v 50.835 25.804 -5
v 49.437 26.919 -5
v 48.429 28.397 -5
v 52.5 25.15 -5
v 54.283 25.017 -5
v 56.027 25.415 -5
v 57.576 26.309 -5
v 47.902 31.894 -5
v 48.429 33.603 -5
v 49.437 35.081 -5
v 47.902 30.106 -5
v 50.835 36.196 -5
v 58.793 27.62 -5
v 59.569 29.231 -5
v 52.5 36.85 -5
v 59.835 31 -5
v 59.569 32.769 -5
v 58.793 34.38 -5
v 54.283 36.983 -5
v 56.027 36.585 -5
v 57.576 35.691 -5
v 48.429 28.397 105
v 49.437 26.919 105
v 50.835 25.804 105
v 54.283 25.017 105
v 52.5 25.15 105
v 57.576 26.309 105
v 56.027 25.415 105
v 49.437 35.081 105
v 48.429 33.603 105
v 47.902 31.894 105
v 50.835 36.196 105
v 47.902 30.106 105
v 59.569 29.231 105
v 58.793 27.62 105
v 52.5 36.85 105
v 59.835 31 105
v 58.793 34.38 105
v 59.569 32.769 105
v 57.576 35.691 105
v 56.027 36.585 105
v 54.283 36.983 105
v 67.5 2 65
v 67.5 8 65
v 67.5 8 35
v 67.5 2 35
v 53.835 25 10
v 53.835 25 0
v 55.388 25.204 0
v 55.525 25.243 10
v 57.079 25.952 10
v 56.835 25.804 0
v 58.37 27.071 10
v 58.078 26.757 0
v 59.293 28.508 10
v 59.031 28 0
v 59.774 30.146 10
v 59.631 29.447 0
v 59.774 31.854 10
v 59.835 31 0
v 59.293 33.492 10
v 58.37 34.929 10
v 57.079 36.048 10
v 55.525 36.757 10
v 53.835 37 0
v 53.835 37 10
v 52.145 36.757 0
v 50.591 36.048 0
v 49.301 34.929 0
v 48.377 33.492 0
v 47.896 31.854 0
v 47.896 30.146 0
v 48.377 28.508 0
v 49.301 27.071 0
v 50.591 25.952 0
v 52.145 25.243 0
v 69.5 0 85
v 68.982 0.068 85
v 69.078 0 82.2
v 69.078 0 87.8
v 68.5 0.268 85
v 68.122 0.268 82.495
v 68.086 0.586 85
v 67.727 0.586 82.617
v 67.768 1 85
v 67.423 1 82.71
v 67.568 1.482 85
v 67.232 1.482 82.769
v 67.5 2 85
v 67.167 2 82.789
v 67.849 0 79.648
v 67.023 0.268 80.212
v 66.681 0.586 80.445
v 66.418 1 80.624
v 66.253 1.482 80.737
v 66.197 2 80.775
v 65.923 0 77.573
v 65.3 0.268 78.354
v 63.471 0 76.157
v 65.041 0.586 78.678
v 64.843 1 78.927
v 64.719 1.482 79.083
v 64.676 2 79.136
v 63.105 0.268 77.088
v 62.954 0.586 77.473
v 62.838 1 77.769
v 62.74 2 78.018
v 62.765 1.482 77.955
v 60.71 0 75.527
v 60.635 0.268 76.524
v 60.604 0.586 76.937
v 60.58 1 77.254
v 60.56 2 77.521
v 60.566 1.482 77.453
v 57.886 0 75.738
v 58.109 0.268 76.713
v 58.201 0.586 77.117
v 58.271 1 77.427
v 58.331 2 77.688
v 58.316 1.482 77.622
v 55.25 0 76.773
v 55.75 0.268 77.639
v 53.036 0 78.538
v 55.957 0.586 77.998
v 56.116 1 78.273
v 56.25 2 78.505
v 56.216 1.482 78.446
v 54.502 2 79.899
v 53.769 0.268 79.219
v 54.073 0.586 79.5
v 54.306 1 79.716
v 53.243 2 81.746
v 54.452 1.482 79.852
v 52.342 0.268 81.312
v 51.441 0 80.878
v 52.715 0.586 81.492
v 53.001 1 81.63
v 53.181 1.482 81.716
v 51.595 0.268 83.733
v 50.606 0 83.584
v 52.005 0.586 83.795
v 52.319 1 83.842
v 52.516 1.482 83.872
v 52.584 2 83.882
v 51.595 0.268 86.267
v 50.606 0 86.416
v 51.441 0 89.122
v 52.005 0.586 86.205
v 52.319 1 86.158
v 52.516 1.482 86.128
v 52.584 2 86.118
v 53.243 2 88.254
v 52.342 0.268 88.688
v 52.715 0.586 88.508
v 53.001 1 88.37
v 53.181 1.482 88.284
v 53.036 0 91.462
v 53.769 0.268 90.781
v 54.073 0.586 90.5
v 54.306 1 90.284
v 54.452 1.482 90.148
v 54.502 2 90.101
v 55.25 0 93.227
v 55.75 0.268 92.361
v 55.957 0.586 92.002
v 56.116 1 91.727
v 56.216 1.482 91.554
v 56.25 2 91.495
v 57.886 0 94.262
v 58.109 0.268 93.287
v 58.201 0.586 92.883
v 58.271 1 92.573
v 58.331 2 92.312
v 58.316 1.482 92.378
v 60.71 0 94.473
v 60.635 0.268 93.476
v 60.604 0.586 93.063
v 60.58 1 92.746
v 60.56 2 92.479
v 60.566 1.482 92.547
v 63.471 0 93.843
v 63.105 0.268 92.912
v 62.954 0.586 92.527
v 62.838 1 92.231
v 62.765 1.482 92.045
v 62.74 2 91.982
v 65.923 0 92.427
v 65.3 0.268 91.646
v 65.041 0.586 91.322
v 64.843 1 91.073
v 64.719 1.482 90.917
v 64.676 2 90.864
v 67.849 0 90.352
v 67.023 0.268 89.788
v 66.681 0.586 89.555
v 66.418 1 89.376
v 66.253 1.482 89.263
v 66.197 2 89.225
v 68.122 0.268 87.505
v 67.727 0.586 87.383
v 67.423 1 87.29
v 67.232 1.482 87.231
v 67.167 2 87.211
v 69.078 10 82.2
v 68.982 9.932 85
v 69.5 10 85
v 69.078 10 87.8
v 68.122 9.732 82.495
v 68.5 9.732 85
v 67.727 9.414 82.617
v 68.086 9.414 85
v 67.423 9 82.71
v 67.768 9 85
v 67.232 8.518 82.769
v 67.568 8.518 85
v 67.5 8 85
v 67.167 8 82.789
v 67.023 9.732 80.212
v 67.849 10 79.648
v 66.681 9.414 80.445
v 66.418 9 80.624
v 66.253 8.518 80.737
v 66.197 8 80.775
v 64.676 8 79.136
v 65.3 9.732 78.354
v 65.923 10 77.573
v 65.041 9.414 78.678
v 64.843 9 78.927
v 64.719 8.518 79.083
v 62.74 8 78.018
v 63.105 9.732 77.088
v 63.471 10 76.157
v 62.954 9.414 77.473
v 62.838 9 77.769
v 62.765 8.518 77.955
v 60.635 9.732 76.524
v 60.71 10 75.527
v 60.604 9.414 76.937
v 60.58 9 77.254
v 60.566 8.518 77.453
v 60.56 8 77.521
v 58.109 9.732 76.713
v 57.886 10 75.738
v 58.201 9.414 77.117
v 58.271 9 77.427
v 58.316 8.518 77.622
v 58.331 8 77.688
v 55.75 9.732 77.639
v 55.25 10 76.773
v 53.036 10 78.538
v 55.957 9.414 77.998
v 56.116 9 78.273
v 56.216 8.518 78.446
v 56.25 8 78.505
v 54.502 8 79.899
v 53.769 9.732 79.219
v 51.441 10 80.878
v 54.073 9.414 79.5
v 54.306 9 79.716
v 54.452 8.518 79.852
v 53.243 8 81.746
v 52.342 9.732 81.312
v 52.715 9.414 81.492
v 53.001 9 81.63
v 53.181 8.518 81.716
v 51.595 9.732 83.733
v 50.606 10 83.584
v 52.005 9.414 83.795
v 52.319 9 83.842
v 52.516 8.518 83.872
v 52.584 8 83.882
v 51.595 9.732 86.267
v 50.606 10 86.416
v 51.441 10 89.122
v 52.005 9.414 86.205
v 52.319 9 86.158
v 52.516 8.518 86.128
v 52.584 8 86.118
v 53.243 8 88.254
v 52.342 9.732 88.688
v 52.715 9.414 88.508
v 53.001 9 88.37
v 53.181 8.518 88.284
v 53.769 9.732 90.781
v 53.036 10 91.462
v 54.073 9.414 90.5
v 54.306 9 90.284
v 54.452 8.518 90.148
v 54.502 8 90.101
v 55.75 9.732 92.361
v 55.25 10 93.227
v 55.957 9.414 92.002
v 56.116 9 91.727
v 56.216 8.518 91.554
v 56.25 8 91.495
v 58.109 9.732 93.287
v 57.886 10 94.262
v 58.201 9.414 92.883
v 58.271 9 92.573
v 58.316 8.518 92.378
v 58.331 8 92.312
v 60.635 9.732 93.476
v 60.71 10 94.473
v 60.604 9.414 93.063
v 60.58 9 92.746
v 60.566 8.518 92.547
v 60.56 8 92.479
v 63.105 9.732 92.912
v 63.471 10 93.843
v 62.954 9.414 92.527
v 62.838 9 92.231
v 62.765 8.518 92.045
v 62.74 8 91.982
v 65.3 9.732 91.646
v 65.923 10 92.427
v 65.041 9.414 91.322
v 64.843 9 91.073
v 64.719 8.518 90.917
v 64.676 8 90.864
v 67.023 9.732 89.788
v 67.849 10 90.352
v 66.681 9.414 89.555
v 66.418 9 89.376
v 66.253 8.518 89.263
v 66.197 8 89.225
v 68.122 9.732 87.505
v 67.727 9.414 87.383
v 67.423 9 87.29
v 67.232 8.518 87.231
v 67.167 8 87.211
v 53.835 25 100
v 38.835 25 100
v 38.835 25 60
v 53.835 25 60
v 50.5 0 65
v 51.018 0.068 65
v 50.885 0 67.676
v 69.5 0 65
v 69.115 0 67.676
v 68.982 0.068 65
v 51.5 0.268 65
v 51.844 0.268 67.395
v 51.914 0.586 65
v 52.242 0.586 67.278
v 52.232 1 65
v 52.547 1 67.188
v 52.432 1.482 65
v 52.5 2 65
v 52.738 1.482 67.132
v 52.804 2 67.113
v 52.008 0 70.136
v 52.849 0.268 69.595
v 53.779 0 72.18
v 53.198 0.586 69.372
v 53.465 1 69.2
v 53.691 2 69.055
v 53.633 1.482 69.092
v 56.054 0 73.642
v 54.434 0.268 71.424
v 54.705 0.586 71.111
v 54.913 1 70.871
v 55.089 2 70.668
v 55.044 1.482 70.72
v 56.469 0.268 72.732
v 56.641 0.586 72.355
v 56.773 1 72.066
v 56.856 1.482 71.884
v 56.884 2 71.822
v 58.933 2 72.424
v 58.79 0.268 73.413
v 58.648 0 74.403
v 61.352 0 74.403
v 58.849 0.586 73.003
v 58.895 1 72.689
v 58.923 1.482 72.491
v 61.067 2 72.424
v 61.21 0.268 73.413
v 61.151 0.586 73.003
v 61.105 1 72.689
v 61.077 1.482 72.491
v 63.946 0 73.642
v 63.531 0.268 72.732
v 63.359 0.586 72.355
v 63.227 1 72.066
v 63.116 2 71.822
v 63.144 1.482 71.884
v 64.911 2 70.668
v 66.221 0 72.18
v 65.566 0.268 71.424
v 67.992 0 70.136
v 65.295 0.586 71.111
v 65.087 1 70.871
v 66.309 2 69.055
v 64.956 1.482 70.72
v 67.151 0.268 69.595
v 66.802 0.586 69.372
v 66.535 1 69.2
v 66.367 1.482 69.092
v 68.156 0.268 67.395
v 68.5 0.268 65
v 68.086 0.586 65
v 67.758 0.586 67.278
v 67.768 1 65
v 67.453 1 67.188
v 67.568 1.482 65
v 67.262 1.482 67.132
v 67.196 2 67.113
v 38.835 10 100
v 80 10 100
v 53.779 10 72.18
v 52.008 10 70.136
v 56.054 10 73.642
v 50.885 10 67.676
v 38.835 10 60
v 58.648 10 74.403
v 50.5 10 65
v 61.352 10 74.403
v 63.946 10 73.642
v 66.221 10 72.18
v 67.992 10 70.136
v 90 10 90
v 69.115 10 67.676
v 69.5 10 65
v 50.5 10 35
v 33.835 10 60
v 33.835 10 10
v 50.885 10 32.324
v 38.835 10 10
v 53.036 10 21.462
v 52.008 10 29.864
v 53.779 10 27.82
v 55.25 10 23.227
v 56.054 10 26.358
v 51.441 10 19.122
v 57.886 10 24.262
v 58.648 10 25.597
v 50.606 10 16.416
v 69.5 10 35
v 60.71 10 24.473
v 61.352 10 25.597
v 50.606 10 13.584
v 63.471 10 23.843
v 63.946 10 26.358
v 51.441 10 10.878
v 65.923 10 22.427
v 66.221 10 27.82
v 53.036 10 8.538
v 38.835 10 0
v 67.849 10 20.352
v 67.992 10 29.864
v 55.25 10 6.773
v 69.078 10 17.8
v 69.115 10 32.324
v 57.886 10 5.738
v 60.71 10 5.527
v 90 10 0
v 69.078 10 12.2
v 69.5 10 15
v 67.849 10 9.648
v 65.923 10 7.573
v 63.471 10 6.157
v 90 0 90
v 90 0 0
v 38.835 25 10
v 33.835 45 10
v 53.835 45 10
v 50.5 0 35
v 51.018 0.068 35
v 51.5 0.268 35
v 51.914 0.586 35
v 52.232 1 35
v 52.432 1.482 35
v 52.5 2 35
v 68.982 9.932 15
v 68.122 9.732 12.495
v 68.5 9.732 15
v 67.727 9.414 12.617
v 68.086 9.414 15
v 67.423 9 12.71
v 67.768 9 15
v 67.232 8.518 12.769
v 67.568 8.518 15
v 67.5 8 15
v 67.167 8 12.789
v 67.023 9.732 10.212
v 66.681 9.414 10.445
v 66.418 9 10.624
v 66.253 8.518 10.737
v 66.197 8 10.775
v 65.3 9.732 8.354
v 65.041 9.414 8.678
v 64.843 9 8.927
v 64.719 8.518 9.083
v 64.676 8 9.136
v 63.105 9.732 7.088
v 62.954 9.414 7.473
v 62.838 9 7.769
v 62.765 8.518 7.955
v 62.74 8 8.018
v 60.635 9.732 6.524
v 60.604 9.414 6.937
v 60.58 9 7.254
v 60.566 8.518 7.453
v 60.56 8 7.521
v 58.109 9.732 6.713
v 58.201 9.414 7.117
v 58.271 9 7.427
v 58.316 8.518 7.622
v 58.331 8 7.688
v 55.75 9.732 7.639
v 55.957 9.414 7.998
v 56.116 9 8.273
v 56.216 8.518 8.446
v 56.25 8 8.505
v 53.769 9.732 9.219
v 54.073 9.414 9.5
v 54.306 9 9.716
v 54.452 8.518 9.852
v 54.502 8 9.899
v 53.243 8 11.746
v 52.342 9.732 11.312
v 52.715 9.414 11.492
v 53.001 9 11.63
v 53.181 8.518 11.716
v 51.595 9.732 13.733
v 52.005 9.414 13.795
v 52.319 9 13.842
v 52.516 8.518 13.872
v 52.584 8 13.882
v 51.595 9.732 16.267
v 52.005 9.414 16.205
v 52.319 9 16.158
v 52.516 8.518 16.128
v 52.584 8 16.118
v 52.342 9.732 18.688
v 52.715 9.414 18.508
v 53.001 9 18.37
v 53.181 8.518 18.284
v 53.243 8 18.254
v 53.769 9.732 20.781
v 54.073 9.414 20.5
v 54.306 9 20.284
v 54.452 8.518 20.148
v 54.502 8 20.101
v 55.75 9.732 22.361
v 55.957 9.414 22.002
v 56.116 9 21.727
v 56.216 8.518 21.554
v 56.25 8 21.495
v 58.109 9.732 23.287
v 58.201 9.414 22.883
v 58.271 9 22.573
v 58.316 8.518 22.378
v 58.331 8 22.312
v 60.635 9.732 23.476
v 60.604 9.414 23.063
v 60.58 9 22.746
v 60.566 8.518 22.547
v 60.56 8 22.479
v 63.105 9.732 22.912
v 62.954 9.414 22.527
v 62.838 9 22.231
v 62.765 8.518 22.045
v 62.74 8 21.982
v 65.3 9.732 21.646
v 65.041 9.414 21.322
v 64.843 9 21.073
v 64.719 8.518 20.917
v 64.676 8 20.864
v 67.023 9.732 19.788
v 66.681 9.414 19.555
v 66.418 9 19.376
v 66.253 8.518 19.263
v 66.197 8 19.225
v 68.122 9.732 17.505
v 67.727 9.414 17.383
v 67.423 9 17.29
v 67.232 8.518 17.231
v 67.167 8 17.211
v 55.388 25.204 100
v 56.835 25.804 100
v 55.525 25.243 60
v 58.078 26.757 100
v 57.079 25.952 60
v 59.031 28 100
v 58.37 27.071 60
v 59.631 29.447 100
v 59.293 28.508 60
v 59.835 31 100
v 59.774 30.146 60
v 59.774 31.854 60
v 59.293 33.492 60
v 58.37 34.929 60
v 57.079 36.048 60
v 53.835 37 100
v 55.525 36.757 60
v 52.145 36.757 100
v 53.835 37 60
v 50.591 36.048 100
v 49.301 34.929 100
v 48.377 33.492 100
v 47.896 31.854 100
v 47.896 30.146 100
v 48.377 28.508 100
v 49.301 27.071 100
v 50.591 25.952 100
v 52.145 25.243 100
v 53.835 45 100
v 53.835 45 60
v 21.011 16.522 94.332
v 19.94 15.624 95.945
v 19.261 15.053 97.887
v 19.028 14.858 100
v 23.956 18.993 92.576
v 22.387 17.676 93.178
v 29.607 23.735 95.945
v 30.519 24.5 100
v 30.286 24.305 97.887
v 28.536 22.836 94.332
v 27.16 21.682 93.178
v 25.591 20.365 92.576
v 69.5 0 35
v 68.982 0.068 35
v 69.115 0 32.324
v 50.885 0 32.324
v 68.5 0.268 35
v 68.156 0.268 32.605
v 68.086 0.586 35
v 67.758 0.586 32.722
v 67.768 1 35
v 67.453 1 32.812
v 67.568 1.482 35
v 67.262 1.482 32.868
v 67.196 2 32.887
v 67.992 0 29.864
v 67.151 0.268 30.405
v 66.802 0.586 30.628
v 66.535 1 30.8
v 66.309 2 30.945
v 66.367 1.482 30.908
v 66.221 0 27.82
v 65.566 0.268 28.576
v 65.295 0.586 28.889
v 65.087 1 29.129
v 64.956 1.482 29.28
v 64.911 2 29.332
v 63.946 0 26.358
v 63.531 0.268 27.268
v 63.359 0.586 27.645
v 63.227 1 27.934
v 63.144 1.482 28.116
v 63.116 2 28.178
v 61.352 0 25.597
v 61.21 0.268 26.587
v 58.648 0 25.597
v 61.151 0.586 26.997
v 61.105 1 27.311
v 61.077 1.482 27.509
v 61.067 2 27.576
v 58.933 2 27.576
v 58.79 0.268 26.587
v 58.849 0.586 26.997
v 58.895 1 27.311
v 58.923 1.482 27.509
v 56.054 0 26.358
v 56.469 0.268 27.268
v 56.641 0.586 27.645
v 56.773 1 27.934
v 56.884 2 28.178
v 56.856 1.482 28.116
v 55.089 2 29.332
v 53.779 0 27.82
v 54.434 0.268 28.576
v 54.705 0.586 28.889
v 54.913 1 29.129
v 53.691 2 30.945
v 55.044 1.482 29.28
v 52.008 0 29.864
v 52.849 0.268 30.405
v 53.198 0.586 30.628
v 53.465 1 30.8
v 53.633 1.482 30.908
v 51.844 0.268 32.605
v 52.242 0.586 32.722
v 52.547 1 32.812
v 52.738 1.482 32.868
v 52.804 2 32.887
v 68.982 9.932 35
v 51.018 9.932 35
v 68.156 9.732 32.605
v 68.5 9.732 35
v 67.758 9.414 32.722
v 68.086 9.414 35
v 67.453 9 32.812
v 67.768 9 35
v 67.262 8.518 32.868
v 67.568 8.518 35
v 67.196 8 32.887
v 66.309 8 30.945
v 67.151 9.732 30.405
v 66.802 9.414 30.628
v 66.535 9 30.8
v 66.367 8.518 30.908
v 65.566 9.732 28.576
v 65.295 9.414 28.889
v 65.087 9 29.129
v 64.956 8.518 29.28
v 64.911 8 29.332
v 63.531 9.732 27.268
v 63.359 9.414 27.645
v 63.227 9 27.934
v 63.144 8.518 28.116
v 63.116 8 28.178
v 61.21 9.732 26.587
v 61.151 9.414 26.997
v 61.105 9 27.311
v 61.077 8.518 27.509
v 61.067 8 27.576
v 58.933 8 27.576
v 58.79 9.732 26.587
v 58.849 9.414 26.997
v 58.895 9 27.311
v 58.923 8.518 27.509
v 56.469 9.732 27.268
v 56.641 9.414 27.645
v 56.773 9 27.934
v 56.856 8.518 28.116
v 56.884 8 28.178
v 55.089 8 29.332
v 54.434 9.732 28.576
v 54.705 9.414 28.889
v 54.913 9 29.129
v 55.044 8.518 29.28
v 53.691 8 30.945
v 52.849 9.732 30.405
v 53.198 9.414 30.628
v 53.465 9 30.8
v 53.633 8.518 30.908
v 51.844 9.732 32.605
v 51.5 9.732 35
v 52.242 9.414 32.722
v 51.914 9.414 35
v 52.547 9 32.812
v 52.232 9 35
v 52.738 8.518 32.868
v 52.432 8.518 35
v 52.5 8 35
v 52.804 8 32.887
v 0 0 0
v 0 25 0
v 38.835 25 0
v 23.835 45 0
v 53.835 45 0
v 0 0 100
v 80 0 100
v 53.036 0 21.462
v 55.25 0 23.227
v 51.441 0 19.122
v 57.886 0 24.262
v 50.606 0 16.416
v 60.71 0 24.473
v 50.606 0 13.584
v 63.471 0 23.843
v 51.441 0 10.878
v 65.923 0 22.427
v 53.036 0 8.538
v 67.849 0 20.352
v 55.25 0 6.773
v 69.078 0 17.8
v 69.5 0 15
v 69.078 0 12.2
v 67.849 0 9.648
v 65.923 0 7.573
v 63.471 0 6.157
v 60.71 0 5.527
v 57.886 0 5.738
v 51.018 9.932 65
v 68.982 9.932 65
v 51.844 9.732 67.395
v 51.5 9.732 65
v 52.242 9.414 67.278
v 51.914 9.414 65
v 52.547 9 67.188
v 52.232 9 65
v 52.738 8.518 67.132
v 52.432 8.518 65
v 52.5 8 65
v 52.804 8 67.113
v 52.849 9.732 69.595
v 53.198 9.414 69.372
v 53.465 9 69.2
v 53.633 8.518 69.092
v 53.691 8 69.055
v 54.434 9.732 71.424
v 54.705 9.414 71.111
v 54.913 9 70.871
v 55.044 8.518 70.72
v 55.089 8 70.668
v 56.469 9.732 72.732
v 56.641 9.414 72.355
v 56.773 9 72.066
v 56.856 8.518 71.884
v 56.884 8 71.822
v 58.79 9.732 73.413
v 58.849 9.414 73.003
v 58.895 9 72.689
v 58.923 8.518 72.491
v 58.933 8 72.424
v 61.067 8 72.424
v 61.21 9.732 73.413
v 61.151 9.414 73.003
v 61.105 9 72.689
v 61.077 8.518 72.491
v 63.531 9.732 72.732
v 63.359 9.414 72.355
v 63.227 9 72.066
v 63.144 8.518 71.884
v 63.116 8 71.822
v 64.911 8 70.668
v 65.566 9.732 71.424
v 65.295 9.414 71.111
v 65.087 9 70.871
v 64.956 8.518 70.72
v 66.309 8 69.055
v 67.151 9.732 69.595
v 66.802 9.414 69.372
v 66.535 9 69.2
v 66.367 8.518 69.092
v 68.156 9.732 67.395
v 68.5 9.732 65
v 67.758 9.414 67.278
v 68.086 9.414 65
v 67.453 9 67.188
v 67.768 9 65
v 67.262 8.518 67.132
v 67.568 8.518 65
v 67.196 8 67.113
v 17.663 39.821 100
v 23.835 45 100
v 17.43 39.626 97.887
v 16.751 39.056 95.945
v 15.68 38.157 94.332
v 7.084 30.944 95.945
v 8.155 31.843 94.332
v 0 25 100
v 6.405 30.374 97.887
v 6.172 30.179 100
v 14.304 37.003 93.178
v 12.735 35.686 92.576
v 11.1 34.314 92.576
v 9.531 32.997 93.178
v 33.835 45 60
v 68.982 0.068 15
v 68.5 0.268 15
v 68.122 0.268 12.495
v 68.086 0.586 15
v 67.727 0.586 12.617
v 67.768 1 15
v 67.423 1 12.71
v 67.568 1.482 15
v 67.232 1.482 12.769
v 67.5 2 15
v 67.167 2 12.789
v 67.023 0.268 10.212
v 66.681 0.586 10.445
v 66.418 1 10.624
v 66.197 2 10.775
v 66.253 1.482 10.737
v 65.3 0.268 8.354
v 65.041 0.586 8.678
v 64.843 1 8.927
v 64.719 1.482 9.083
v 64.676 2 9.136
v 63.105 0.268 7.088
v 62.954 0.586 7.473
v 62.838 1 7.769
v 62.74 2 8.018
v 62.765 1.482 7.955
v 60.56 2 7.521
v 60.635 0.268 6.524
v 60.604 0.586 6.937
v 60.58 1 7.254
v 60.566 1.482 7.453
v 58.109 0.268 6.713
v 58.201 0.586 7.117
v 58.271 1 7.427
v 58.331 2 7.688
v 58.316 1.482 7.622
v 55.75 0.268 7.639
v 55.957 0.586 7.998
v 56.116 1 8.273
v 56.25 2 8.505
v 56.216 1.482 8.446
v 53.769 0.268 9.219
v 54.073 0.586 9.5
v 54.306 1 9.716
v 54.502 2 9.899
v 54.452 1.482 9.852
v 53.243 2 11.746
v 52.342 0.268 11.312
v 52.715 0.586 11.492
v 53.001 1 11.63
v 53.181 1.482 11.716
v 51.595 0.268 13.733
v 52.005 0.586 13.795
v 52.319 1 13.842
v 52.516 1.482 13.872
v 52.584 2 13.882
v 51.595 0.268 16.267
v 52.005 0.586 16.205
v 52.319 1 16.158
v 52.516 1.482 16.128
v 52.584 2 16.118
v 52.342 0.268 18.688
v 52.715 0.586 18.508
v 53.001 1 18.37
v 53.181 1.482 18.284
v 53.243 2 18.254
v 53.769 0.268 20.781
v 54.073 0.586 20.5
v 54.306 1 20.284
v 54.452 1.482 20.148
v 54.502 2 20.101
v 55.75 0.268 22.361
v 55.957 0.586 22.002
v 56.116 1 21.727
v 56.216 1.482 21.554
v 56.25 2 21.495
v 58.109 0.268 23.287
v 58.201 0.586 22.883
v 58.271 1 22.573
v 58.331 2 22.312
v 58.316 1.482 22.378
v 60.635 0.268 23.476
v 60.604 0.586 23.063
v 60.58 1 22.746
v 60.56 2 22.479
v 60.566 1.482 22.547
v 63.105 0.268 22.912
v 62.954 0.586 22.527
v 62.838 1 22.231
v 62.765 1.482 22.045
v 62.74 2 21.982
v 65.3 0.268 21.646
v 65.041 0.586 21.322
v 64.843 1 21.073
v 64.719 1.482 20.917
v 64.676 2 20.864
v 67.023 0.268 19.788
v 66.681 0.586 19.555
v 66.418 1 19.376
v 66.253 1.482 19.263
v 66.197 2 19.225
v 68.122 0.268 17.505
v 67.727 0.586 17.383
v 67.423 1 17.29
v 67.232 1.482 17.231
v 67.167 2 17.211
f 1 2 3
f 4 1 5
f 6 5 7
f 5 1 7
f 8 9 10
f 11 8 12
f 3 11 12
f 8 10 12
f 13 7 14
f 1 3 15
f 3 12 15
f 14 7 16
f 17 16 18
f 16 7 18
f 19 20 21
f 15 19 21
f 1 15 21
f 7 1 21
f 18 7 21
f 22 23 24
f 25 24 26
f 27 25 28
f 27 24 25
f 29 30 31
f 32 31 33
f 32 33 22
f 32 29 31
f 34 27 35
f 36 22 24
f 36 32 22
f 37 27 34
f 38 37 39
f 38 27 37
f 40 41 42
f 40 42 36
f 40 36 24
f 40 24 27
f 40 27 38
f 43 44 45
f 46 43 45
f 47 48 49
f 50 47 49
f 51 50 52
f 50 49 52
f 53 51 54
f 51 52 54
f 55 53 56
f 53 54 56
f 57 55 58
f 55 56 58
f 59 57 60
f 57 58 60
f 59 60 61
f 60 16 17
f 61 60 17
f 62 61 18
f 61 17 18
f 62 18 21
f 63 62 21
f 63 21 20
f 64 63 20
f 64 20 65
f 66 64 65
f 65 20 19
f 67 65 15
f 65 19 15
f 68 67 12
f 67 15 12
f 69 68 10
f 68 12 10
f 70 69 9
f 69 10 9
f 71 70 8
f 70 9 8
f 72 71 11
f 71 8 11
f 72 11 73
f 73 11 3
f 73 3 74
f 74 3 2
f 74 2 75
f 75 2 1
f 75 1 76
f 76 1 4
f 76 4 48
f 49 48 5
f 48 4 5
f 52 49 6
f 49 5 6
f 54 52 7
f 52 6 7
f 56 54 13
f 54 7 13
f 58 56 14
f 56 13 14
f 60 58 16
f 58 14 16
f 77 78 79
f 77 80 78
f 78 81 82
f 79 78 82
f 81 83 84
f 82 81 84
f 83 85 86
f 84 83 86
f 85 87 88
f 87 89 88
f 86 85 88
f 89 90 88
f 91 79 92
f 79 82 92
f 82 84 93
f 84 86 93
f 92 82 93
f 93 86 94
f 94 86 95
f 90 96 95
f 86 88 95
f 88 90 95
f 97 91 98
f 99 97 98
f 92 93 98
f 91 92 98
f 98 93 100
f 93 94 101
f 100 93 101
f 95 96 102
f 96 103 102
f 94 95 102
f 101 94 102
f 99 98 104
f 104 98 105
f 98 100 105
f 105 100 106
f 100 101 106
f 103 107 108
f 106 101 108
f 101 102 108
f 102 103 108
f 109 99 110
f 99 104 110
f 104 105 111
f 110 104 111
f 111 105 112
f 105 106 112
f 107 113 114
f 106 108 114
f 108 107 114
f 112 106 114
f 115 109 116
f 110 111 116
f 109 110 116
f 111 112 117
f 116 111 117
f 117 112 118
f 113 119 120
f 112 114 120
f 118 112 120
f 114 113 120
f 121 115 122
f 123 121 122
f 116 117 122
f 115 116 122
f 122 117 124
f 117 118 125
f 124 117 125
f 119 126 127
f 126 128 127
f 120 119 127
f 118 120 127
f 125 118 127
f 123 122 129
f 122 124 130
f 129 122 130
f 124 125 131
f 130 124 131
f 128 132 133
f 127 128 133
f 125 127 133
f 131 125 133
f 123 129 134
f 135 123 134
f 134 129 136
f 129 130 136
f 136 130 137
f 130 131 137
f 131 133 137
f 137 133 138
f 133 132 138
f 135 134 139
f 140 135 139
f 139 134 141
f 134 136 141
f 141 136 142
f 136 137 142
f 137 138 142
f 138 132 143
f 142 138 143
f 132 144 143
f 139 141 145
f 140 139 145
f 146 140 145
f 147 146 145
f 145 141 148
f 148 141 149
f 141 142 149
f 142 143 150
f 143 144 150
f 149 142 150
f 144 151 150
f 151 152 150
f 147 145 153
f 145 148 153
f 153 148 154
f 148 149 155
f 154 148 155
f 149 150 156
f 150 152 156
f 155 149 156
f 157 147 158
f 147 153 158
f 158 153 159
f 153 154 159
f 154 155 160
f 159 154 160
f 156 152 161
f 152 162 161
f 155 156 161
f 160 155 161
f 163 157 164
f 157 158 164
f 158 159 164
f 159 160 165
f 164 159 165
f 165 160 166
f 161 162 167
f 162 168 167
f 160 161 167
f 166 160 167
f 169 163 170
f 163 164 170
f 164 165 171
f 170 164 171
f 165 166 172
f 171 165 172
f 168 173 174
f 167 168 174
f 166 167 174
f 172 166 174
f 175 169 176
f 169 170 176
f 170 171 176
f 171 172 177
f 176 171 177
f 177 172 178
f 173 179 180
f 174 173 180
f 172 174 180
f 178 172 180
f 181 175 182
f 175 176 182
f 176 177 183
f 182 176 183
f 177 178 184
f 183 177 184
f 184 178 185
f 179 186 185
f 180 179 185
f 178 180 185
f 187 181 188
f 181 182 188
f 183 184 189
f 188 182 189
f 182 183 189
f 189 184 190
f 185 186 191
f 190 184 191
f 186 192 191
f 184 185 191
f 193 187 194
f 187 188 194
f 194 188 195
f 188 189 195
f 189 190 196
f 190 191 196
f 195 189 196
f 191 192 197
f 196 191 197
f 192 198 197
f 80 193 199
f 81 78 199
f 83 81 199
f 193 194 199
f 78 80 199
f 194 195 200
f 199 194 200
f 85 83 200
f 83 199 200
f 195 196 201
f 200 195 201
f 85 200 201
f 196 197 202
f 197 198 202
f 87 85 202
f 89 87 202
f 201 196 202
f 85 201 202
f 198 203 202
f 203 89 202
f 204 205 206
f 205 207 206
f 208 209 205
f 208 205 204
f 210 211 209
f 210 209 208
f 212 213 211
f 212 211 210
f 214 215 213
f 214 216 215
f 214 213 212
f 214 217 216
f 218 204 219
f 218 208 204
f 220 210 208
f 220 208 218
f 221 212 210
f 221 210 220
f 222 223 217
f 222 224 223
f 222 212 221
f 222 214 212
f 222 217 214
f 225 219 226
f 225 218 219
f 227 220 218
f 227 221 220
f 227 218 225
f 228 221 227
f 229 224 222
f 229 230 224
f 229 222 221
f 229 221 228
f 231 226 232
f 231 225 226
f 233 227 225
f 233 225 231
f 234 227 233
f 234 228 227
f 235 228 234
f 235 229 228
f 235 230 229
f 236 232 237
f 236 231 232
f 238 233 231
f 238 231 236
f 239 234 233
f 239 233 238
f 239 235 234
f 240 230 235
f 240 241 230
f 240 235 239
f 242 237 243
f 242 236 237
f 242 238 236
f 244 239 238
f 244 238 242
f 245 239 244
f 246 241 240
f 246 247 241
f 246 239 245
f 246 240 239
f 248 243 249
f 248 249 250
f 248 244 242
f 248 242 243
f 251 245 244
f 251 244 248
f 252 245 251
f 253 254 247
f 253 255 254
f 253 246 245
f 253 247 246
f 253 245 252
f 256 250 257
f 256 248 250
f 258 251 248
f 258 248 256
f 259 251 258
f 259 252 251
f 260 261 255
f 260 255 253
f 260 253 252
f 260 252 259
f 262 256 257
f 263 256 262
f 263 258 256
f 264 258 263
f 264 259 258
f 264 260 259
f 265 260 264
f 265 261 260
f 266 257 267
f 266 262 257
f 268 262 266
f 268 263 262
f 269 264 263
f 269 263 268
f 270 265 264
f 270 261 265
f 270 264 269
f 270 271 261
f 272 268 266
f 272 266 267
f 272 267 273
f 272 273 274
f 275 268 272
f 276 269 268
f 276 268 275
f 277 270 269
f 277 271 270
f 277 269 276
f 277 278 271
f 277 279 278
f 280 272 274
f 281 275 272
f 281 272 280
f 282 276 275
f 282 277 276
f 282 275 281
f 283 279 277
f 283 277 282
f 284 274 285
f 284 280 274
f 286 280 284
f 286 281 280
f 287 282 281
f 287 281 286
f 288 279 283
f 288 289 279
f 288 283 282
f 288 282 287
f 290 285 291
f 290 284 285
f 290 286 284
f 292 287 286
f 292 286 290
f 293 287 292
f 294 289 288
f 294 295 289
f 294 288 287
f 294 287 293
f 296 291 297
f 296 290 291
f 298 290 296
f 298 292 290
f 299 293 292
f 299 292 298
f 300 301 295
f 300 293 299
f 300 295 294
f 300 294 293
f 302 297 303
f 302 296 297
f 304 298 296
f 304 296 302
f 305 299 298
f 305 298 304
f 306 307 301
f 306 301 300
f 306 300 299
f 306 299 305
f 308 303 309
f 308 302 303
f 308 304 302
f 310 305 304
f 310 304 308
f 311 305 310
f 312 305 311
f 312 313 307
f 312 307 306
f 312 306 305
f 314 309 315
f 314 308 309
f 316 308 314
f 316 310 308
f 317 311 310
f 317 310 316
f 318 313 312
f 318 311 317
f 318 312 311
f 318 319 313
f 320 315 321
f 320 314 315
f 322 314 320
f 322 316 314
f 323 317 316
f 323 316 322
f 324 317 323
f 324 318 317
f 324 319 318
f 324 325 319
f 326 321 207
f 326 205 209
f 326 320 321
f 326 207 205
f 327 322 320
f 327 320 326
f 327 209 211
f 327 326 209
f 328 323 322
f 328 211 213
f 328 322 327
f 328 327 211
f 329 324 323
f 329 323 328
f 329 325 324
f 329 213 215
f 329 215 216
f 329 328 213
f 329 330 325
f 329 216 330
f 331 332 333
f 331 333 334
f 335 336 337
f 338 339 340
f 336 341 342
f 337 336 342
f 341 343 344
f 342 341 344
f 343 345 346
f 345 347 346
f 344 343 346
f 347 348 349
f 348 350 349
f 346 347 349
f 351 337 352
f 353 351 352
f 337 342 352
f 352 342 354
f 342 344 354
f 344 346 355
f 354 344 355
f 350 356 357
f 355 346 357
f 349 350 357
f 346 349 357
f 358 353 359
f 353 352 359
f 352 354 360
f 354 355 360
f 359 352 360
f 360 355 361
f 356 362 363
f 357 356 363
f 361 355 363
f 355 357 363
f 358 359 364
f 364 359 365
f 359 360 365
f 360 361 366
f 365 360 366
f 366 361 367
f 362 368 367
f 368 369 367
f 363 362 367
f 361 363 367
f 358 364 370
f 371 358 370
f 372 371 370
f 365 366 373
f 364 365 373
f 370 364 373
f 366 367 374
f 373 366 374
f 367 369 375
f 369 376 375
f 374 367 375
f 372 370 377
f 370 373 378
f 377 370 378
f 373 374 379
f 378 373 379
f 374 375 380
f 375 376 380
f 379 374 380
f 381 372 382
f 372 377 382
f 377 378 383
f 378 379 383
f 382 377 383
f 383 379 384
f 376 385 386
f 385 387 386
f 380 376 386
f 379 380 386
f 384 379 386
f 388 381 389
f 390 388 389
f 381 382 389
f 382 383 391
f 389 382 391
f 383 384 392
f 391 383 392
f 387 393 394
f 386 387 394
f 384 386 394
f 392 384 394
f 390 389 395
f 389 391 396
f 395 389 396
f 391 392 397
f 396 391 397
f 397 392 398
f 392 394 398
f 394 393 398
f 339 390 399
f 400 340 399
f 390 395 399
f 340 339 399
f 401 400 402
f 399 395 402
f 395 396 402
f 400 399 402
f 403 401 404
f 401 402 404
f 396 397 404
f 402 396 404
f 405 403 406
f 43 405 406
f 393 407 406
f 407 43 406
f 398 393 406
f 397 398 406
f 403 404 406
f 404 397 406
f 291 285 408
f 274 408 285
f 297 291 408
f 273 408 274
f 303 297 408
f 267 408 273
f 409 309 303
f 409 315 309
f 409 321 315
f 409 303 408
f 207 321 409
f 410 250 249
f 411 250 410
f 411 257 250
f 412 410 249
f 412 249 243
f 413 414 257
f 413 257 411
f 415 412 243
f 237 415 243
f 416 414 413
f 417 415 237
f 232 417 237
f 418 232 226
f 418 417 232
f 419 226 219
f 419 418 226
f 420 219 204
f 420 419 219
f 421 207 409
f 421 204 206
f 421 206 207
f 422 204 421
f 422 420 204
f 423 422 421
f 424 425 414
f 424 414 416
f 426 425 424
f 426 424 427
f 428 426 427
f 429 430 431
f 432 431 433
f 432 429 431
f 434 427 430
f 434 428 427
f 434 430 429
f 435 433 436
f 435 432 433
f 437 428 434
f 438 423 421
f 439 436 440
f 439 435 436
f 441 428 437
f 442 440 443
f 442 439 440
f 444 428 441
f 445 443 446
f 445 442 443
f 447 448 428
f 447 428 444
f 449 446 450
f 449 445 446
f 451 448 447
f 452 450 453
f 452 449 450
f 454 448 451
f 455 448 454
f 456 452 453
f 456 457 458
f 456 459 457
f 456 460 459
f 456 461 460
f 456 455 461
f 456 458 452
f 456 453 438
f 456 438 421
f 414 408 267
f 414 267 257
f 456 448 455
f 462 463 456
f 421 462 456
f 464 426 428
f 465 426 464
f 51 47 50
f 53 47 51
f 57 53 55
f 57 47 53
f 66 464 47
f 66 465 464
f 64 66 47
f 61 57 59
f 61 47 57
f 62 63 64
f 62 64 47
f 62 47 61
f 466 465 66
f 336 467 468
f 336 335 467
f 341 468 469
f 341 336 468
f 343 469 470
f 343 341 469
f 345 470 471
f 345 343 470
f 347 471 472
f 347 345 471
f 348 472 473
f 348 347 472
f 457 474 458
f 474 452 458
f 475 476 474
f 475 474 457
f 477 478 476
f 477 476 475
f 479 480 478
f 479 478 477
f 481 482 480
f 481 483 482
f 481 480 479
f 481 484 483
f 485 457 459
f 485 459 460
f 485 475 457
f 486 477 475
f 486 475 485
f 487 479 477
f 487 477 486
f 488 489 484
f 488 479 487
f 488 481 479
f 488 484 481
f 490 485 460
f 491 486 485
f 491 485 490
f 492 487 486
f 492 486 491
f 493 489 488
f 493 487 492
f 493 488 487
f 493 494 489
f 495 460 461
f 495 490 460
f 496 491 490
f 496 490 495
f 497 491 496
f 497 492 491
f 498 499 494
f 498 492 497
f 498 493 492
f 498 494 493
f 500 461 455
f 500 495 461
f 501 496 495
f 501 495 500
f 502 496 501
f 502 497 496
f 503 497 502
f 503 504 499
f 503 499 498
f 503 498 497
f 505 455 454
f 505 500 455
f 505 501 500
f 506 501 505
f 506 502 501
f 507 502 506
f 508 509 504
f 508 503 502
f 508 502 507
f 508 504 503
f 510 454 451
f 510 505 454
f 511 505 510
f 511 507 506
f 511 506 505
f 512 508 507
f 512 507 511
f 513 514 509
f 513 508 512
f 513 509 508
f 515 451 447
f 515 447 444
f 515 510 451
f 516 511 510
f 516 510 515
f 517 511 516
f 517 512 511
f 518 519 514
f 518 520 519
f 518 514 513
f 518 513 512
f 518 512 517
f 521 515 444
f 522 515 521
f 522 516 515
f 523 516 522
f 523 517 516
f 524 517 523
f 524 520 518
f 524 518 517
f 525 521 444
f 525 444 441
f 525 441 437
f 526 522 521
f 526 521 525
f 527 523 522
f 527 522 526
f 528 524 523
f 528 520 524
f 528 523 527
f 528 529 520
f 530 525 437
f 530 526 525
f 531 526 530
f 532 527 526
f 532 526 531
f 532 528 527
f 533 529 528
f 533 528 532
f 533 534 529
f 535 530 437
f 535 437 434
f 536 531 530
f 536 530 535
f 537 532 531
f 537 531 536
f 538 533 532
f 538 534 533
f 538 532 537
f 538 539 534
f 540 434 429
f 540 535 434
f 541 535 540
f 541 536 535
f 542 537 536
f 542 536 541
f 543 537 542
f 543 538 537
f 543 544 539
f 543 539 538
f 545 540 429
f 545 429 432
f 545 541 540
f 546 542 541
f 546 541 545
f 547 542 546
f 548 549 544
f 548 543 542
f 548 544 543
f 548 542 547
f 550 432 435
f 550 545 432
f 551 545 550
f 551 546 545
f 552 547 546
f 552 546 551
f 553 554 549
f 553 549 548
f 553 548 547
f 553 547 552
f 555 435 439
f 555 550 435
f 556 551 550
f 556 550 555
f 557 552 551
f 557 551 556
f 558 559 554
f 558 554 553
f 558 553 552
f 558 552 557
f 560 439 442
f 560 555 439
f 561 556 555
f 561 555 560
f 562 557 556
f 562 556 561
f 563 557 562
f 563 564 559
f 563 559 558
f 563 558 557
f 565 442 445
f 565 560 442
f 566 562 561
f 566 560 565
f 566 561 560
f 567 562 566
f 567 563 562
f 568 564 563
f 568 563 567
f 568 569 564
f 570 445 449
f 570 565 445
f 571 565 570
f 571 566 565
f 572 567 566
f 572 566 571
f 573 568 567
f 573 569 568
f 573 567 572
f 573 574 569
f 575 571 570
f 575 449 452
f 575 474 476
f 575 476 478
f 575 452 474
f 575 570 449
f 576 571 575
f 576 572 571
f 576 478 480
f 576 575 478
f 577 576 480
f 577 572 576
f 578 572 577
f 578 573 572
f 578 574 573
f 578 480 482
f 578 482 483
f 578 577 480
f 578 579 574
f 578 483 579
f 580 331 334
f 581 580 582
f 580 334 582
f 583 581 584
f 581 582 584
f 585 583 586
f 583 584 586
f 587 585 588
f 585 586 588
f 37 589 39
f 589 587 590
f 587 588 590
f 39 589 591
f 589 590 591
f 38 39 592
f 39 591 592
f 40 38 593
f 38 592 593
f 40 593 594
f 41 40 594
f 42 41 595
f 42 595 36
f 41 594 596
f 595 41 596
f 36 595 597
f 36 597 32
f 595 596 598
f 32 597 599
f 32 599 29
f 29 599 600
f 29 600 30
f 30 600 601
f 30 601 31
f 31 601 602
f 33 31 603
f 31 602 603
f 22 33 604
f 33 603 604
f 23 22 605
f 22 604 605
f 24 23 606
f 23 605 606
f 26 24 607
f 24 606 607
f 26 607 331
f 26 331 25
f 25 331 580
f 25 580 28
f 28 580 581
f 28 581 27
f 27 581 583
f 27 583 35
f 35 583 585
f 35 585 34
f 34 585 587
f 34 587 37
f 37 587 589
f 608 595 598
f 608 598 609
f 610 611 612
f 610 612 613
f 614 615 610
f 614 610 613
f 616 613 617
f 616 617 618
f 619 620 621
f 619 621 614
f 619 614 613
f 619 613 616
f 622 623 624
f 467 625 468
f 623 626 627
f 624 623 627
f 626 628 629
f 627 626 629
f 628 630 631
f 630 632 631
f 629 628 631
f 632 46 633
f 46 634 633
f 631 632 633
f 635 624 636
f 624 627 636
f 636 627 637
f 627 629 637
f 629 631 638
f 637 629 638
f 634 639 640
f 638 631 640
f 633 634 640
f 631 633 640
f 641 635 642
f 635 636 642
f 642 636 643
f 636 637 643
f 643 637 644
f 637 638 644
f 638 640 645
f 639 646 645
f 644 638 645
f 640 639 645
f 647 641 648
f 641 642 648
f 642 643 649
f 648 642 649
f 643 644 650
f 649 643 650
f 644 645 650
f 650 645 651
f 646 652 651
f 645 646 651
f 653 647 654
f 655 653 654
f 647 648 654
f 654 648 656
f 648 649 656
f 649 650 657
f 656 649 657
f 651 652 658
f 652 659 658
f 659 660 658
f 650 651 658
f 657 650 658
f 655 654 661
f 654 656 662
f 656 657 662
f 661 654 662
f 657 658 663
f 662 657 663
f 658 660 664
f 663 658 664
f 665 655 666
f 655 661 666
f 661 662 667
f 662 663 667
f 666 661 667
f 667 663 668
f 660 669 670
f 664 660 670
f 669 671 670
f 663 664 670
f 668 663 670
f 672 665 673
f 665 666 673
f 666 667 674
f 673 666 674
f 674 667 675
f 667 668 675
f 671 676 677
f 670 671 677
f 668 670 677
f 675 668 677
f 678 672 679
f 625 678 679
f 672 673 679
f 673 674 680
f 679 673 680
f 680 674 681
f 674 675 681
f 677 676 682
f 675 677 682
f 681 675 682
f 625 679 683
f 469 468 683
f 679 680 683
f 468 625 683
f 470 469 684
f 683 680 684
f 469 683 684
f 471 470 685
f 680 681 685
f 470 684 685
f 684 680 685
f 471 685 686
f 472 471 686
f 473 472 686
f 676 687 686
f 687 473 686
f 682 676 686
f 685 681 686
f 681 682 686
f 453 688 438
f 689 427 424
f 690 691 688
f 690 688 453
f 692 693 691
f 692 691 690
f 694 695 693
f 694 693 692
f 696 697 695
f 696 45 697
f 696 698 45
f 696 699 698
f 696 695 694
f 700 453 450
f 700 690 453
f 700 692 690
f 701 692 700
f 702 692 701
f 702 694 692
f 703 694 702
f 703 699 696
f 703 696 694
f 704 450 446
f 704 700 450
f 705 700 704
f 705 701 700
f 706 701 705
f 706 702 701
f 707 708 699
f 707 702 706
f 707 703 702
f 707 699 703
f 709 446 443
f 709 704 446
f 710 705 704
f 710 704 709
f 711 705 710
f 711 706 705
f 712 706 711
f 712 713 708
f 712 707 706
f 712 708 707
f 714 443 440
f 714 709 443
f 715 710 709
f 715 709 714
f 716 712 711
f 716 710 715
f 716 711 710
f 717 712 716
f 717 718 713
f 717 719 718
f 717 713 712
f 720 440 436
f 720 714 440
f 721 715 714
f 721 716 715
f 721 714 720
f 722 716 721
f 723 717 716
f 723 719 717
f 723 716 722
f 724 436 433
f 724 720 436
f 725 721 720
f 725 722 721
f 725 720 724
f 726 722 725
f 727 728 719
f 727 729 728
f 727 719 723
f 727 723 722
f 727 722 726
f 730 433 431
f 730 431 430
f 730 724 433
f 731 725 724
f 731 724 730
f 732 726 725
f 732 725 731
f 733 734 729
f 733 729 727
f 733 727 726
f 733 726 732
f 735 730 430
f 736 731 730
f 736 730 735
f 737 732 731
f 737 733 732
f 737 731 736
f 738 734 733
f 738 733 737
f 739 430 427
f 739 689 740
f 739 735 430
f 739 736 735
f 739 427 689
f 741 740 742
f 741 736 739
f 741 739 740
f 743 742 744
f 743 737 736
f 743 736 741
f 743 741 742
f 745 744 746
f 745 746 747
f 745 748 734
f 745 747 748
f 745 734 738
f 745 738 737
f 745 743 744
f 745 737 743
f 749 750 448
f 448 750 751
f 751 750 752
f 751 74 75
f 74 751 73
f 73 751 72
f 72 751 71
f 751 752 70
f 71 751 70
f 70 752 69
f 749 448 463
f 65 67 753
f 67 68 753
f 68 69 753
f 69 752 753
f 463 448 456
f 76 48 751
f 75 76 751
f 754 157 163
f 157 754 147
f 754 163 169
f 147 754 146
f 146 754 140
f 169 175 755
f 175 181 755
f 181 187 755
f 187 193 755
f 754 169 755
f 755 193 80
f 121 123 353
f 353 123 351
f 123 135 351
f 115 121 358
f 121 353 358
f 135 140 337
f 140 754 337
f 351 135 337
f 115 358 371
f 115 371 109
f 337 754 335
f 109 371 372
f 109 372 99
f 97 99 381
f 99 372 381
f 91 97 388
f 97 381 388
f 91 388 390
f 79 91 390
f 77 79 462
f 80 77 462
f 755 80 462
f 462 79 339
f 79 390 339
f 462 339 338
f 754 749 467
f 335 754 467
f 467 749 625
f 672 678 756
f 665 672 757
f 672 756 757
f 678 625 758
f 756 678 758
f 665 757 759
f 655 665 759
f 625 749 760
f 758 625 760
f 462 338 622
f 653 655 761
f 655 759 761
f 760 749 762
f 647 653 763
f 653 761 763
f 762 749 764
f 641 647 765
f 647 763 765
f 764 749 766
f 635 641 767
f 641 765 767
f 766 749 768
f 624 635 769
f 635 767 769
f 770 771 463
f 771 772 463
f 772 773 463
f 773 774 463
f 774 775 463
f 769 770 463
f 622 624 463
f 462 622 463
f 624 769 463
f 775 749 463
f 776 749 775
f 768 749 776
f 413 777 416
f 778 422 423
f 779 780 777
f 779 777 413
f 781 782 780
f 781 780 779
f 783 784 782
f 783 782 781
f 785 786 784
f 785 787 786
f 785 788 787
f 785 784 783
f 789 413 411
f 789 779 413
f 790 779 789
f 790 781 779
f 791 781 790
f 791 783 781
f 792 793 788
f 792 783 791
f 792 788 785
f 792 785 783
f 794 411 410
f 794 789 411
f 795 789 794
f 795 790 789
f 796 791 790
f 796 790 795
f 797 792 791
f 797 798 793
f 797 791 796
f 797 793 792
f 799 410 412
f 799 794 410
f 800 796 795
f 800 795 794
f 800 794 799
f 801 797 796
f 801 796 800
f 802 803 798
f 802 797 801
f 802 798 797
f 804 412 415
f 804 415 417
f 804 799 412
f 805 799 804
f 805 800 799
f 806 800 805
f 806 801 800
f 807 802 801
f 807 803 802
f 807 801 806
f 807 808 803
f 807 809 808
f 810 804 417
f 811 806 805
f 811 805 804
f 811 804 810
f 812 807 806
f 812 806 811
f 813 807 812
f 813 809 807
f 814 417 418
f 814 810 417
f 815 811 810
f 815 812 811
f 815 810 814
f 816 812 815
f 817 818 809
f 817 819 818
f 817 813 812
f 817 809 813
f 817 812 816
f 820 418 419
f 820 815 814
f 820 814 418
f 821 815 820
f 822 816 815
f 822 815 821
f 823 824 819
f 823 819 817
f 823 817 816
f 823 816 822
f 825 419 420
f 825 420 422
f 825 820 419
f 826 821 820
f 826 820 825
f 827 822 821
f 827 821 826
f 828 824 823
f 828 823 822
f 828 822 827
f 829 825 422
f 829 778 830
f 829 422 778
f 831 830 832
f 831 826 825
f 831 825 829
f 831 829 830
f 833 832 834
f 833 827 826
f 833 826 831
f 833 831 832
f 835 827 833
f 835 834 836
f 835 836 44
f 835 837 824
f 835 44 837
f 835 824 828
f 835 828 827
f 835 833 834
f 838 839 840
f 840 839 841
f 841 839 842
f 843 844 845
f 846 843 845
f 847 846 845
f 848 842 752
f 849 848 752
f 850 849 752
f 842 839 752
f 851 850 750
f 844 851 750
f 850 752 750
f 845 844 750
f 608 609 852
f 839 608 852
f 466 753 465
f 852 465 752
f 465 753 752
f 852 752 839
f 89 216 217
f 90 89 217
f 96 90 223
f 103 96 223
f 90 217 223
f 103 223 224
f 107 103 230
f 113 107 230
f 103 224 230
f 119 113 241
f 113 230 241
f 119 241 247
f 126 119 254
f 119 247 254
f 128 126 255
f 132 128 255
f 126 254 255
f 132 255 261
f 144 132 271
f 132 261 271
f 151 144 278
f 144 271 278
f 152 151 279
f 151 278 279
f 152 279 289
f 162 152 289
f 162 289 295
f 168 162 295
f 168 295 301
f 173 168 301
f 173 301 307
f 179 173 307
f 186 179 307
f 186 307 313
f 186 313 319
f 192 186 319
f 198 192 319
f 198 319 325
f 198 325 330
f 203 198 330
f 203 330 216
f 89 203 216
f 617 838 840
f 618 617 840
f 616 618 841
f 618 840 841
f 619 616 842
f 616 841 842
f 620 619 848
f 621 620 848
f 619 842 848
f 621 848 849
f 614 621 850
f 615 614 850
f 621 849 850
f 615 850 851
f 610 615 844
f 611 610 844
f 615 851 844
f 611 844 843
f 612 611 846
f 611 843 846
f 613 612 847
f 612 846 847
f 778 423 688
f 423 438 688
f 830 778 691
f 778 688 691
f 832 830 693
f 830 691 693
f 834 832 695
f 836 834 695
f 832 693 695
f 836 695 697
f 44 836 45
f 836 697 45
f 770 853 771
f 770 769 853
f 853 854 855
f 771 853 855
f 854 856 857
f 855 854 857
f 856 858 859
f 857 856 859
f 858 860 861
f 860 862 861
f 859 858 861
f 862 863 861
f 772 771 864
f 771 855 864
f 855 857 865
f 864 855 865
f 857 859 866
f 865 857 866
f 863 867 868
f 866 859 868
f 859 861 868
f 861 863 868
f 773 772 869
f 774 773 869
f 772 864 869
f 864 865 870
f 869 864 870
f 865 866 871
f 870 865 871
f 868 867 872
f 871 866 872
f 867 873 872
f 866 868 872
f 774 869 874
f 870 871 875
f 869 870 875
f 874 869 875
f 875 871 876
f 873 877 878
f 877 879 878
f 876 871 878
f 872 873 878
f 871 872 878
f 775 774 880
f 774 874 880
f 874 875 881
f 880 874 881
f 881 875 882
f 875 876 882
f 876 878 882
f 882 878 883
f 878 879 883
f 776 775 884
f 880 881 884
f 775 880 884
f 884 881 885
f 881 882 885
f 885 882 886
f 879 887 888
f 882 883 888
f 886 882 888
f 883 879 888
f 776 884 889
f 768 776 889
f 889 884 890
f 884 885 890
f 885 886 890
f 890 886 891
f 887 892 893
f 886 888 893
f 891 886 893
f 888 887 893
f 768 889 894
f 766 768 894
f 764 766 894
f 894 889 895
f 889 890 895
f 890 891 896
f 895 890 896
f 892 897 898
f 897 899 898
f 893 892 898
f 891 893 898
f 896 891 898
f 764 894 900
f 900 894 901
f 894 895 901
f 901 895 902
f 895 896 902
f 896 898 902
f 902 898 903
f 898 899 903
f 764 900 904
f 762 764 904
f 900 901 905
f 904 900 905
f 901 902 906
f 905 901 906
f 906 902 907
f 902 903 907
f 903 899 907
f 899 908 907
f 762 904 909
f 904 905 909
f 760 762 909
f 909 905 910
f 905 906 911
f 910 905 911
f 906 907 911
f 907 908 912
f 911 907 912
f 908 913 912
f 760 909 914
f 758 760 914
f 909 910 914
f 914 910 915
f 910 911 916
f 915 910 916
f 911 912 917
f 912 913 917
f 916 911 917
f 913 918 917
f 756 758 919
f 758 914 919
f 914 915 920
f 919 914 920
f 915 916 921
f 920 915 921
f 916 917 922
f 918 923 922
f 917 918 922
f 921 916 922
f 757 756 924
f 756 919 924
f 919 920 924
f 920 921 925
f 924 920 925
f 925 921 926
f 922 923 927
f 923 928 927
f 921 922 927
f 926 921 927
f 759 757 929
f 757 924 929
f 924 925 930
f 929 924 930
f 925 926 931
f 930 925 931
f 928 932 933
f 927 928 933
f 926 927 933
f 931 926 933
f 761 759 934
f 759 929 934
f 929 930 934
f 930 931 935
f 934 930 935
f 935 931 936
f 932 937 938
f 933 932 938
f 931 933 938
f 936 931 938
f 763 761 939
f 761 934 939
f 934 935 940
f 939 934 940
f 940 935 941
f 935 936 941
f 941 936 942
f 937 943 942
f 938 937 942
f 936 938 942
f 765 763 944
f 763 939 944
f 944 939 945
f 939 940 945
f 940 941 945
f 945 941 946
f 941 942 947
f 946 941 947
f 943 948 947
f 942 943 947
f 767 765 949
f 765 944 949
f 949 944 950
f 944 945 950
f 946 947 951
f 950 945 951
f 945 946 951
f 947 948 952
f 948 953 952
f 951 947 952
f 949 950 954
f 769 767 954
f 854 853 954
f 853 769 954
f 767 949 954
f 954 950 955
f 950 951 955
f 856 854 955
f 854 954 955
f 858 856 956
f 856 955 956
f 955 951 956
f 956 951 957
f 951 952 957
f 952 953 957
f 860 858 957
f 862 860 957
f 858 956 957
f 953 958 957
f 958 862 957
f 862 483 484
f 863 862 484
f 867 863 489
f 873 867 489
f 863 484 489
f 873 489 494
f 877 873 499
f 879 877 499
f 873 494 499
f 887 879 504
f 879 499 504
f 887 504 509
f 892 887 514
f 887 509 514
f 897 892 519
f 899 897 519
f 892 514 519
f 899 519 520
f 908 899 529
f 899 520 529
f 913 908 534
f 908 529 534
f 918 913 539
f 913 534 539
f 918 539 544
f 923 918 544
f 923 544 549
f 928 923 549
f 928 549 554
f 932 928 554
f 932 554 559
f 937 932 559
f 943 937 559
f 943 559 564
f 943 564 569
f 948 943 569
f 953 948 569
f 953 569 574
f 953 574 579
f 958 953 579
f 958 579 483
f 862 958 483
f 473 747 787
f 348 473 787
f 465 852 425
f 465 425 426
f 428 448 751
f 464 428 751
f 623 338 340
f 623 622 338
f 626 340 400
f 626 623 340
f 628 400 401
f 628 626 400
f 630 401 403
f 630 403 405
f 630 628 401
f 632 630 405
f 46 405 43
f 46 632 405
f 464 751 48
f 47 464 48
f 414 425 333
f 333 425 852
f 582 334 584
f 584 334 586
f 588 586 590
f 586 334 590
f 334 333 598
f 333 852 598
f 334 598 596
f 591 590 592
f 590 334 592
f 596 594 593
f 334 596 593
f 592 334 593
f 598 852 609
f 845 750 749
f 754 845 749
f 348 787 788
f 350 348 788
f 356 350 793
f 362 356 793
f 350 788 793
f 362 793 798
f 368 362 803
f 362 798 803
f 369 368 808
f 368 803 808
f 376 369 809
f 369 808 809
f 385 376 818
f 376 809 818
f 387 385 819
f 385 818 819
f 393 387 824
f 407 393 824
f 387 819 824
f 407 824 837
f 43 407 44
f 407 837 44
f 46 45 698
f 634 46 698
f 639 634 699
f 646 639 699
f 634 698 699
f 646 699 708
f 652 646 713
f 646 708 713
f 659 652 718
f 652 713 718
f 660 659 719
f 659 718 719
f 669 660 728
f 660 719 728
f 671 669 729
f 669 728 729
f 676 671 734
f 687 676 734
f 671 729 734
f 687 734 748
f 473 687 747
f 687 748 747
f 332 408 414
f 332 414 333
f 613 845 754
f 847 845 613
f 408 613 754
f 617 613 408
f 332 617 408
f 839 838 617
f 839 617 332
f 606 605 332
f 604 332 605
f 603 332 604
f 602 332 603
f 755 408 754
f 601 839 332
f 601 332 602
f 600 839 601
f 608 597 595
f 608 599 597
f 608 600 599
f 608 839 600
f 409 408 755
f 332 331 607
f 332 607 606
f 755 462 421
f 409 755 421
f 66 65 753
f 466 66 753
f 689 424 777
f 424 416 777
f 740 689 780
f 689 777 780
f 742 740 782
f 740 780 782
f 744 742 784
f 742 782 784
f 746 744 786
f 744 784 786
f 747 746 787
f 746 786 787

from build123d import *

# Parameters (mm, degrees)
DODANIE_WYCI_GNI_CIE1_DEPTH      = 100
SFAZOWANIE1_SIZE                 = 10
SZKIC3_R                         = 6
DODANIE_WYCI_GNI_CIE2_DEPTH      = 5
DODANIE_WYCI_GNI_CIE2_DEPTH_BACK = 105
SZKIC4_W                         = 26
SZKIC4_H                         = 50
WYTNIJ_WYCI_GNI_CIE1_DEPTH       = 35
SZKIC5_R                         = 7.5
WYTNIJ_WYCI_GNI_CIE3_DEPTH       = 11
ZAOKR_GLENIE2_R                  = 2
SZKIC6_R                         = 7.5
WYTNIJ_WYCI_GNI_CIE5_DEPTH       = 20


with BuildPart() as part:
    # Szkic2 → Dodanie-wyciągnięcie1 (new body)
    with BuildSketch(Plane.XY):
        with BuildLine():
            Line((0, 0), (90, 0))
            Line((90, 0), (90, 10))
            Line((90, 10), (38.835071852, 10))
            Line((38.835071852, 10), (38.835071852, 25))
            Line((38.835071852, 25), (53.835071852, 25))
            ThreePointArc((53.835071852, 25), (59.835071852, 31), (53.835071852, 37))
            Line((53.835071852, 37), (53.835071852, 45))
            Line((53.835071852, 45), (23.835071852, 45))
            Line((23.835071852, 45), (0, 25))
            Line((0, 25), (0, 0))
        make_face()
    extrude(amount=DODANIE_WYCI_GNI_CIE1_DEPTH)

    # Sfazowanie1
    sfazowanie1_edges = [part.edges().sort_by_distance(p)[0] for p in [
        (90, 5, 100),
    ]]
    chamfer(sfazowanie1_edges, length=SFAZOWANIE1_SIZE)

    # Szkic3 → Dodanie-wyciągnięcie2 (add, two sides)
    with BuildSketch(Plane.XY.offset(100)) as dodanie_wyci_gni_cie2_sk:
        with Locations((53.835071852, 31)):
            Circle(SZKIC3_R)
    extrude(amount=DODANIE_WYCI_GNI_CIE2_DEPTH)
    extrude(dodanie_wyci_gni_cie2_sk.sketch, amount=-DODANIE_WYCI_GNI_CIE2_DEPTH_BACK)

    # Szkic4 → Wytnij-wyciągnięcie1 (cut)
    with BuildSketch(Plane(origin=(0, 45, 0), x_dir=(1, 0, 0), z_dir=(0, 1, 0))):
        with Locations((46.835071852, -35)):
            Rectangle(SZKIC4_W, SZKIC4_H)
    extrude(amount=-WYTNIJ_WYCI_GNI_CIE1_DEPTH, mode=Mode.SUBTRACT)

    # Szkic5 → Wytnij-wyciągnięcie3 (cut, through all)
    with BuildSketch(Plane(origin=(0, 10, 0), x_dir=(1, 0, 0), z_dir=(0, 1, 0))):
        with Locations((60, -15)):
            Circle(SZKIC5_R)
        with Locations((60, -85)):
            Circle(SZKIC5_R)
        with BuildLine():
            Line((52.5, -35), (52.5, -65))
            ThreePointArc((52.5, -65), (60, -72.5), (67.5, -65))
            Line((67.5, -65), (67.5, -35))
            ThreePointArc((67.5, -35), (60, -27.5), (52.5, -35))
        make_face()
    extrude(amount=-WYTNIJ_WYCI_GNI_CIE3_DEPTH, mode=Mode.SUBTRACT)

    # Zaokrąglenie2
    zaokr_glenie2_edges = [part.edges().sort_by_distance(p)[0] for p in [
        (52.5, 0, 15),
        (52.5, 10, 15),
        (52.5, 0, 85),
        (52.5, 10, 85),
        (60, 0, 27.5),
        (67.5, 0, 50),
        (60, 0, 72.5),
        (52.5, 0, 50),
        (60, 10, 27.5),
        (52.5, 10, 50),
        (60, 10, 72.5),
        (67.5, 10, 50),
    ]]
    fillet(zaokr_glenie2_edges, radius=ZAOKR_GLENIE2_R)

    # Szkic6 → Wytnij-wyciągnięcie5 (cut)
    with BuildSketch(Plane(origin=(-12.310096913, 14.670602221, 0), x_dir=(0.766044443, 0.64278761, 0), z_dir=(-0.64278761, 0.766044443, 0))):
        with Locations((31.626928511, -100)):
            Circle(SZKIC6_R)
    extrude(amount=-WYTNIJ_WYCI_GNI_CIE5_DEPTH, mode=Mode.SUBTRACT)


solid = part.part
